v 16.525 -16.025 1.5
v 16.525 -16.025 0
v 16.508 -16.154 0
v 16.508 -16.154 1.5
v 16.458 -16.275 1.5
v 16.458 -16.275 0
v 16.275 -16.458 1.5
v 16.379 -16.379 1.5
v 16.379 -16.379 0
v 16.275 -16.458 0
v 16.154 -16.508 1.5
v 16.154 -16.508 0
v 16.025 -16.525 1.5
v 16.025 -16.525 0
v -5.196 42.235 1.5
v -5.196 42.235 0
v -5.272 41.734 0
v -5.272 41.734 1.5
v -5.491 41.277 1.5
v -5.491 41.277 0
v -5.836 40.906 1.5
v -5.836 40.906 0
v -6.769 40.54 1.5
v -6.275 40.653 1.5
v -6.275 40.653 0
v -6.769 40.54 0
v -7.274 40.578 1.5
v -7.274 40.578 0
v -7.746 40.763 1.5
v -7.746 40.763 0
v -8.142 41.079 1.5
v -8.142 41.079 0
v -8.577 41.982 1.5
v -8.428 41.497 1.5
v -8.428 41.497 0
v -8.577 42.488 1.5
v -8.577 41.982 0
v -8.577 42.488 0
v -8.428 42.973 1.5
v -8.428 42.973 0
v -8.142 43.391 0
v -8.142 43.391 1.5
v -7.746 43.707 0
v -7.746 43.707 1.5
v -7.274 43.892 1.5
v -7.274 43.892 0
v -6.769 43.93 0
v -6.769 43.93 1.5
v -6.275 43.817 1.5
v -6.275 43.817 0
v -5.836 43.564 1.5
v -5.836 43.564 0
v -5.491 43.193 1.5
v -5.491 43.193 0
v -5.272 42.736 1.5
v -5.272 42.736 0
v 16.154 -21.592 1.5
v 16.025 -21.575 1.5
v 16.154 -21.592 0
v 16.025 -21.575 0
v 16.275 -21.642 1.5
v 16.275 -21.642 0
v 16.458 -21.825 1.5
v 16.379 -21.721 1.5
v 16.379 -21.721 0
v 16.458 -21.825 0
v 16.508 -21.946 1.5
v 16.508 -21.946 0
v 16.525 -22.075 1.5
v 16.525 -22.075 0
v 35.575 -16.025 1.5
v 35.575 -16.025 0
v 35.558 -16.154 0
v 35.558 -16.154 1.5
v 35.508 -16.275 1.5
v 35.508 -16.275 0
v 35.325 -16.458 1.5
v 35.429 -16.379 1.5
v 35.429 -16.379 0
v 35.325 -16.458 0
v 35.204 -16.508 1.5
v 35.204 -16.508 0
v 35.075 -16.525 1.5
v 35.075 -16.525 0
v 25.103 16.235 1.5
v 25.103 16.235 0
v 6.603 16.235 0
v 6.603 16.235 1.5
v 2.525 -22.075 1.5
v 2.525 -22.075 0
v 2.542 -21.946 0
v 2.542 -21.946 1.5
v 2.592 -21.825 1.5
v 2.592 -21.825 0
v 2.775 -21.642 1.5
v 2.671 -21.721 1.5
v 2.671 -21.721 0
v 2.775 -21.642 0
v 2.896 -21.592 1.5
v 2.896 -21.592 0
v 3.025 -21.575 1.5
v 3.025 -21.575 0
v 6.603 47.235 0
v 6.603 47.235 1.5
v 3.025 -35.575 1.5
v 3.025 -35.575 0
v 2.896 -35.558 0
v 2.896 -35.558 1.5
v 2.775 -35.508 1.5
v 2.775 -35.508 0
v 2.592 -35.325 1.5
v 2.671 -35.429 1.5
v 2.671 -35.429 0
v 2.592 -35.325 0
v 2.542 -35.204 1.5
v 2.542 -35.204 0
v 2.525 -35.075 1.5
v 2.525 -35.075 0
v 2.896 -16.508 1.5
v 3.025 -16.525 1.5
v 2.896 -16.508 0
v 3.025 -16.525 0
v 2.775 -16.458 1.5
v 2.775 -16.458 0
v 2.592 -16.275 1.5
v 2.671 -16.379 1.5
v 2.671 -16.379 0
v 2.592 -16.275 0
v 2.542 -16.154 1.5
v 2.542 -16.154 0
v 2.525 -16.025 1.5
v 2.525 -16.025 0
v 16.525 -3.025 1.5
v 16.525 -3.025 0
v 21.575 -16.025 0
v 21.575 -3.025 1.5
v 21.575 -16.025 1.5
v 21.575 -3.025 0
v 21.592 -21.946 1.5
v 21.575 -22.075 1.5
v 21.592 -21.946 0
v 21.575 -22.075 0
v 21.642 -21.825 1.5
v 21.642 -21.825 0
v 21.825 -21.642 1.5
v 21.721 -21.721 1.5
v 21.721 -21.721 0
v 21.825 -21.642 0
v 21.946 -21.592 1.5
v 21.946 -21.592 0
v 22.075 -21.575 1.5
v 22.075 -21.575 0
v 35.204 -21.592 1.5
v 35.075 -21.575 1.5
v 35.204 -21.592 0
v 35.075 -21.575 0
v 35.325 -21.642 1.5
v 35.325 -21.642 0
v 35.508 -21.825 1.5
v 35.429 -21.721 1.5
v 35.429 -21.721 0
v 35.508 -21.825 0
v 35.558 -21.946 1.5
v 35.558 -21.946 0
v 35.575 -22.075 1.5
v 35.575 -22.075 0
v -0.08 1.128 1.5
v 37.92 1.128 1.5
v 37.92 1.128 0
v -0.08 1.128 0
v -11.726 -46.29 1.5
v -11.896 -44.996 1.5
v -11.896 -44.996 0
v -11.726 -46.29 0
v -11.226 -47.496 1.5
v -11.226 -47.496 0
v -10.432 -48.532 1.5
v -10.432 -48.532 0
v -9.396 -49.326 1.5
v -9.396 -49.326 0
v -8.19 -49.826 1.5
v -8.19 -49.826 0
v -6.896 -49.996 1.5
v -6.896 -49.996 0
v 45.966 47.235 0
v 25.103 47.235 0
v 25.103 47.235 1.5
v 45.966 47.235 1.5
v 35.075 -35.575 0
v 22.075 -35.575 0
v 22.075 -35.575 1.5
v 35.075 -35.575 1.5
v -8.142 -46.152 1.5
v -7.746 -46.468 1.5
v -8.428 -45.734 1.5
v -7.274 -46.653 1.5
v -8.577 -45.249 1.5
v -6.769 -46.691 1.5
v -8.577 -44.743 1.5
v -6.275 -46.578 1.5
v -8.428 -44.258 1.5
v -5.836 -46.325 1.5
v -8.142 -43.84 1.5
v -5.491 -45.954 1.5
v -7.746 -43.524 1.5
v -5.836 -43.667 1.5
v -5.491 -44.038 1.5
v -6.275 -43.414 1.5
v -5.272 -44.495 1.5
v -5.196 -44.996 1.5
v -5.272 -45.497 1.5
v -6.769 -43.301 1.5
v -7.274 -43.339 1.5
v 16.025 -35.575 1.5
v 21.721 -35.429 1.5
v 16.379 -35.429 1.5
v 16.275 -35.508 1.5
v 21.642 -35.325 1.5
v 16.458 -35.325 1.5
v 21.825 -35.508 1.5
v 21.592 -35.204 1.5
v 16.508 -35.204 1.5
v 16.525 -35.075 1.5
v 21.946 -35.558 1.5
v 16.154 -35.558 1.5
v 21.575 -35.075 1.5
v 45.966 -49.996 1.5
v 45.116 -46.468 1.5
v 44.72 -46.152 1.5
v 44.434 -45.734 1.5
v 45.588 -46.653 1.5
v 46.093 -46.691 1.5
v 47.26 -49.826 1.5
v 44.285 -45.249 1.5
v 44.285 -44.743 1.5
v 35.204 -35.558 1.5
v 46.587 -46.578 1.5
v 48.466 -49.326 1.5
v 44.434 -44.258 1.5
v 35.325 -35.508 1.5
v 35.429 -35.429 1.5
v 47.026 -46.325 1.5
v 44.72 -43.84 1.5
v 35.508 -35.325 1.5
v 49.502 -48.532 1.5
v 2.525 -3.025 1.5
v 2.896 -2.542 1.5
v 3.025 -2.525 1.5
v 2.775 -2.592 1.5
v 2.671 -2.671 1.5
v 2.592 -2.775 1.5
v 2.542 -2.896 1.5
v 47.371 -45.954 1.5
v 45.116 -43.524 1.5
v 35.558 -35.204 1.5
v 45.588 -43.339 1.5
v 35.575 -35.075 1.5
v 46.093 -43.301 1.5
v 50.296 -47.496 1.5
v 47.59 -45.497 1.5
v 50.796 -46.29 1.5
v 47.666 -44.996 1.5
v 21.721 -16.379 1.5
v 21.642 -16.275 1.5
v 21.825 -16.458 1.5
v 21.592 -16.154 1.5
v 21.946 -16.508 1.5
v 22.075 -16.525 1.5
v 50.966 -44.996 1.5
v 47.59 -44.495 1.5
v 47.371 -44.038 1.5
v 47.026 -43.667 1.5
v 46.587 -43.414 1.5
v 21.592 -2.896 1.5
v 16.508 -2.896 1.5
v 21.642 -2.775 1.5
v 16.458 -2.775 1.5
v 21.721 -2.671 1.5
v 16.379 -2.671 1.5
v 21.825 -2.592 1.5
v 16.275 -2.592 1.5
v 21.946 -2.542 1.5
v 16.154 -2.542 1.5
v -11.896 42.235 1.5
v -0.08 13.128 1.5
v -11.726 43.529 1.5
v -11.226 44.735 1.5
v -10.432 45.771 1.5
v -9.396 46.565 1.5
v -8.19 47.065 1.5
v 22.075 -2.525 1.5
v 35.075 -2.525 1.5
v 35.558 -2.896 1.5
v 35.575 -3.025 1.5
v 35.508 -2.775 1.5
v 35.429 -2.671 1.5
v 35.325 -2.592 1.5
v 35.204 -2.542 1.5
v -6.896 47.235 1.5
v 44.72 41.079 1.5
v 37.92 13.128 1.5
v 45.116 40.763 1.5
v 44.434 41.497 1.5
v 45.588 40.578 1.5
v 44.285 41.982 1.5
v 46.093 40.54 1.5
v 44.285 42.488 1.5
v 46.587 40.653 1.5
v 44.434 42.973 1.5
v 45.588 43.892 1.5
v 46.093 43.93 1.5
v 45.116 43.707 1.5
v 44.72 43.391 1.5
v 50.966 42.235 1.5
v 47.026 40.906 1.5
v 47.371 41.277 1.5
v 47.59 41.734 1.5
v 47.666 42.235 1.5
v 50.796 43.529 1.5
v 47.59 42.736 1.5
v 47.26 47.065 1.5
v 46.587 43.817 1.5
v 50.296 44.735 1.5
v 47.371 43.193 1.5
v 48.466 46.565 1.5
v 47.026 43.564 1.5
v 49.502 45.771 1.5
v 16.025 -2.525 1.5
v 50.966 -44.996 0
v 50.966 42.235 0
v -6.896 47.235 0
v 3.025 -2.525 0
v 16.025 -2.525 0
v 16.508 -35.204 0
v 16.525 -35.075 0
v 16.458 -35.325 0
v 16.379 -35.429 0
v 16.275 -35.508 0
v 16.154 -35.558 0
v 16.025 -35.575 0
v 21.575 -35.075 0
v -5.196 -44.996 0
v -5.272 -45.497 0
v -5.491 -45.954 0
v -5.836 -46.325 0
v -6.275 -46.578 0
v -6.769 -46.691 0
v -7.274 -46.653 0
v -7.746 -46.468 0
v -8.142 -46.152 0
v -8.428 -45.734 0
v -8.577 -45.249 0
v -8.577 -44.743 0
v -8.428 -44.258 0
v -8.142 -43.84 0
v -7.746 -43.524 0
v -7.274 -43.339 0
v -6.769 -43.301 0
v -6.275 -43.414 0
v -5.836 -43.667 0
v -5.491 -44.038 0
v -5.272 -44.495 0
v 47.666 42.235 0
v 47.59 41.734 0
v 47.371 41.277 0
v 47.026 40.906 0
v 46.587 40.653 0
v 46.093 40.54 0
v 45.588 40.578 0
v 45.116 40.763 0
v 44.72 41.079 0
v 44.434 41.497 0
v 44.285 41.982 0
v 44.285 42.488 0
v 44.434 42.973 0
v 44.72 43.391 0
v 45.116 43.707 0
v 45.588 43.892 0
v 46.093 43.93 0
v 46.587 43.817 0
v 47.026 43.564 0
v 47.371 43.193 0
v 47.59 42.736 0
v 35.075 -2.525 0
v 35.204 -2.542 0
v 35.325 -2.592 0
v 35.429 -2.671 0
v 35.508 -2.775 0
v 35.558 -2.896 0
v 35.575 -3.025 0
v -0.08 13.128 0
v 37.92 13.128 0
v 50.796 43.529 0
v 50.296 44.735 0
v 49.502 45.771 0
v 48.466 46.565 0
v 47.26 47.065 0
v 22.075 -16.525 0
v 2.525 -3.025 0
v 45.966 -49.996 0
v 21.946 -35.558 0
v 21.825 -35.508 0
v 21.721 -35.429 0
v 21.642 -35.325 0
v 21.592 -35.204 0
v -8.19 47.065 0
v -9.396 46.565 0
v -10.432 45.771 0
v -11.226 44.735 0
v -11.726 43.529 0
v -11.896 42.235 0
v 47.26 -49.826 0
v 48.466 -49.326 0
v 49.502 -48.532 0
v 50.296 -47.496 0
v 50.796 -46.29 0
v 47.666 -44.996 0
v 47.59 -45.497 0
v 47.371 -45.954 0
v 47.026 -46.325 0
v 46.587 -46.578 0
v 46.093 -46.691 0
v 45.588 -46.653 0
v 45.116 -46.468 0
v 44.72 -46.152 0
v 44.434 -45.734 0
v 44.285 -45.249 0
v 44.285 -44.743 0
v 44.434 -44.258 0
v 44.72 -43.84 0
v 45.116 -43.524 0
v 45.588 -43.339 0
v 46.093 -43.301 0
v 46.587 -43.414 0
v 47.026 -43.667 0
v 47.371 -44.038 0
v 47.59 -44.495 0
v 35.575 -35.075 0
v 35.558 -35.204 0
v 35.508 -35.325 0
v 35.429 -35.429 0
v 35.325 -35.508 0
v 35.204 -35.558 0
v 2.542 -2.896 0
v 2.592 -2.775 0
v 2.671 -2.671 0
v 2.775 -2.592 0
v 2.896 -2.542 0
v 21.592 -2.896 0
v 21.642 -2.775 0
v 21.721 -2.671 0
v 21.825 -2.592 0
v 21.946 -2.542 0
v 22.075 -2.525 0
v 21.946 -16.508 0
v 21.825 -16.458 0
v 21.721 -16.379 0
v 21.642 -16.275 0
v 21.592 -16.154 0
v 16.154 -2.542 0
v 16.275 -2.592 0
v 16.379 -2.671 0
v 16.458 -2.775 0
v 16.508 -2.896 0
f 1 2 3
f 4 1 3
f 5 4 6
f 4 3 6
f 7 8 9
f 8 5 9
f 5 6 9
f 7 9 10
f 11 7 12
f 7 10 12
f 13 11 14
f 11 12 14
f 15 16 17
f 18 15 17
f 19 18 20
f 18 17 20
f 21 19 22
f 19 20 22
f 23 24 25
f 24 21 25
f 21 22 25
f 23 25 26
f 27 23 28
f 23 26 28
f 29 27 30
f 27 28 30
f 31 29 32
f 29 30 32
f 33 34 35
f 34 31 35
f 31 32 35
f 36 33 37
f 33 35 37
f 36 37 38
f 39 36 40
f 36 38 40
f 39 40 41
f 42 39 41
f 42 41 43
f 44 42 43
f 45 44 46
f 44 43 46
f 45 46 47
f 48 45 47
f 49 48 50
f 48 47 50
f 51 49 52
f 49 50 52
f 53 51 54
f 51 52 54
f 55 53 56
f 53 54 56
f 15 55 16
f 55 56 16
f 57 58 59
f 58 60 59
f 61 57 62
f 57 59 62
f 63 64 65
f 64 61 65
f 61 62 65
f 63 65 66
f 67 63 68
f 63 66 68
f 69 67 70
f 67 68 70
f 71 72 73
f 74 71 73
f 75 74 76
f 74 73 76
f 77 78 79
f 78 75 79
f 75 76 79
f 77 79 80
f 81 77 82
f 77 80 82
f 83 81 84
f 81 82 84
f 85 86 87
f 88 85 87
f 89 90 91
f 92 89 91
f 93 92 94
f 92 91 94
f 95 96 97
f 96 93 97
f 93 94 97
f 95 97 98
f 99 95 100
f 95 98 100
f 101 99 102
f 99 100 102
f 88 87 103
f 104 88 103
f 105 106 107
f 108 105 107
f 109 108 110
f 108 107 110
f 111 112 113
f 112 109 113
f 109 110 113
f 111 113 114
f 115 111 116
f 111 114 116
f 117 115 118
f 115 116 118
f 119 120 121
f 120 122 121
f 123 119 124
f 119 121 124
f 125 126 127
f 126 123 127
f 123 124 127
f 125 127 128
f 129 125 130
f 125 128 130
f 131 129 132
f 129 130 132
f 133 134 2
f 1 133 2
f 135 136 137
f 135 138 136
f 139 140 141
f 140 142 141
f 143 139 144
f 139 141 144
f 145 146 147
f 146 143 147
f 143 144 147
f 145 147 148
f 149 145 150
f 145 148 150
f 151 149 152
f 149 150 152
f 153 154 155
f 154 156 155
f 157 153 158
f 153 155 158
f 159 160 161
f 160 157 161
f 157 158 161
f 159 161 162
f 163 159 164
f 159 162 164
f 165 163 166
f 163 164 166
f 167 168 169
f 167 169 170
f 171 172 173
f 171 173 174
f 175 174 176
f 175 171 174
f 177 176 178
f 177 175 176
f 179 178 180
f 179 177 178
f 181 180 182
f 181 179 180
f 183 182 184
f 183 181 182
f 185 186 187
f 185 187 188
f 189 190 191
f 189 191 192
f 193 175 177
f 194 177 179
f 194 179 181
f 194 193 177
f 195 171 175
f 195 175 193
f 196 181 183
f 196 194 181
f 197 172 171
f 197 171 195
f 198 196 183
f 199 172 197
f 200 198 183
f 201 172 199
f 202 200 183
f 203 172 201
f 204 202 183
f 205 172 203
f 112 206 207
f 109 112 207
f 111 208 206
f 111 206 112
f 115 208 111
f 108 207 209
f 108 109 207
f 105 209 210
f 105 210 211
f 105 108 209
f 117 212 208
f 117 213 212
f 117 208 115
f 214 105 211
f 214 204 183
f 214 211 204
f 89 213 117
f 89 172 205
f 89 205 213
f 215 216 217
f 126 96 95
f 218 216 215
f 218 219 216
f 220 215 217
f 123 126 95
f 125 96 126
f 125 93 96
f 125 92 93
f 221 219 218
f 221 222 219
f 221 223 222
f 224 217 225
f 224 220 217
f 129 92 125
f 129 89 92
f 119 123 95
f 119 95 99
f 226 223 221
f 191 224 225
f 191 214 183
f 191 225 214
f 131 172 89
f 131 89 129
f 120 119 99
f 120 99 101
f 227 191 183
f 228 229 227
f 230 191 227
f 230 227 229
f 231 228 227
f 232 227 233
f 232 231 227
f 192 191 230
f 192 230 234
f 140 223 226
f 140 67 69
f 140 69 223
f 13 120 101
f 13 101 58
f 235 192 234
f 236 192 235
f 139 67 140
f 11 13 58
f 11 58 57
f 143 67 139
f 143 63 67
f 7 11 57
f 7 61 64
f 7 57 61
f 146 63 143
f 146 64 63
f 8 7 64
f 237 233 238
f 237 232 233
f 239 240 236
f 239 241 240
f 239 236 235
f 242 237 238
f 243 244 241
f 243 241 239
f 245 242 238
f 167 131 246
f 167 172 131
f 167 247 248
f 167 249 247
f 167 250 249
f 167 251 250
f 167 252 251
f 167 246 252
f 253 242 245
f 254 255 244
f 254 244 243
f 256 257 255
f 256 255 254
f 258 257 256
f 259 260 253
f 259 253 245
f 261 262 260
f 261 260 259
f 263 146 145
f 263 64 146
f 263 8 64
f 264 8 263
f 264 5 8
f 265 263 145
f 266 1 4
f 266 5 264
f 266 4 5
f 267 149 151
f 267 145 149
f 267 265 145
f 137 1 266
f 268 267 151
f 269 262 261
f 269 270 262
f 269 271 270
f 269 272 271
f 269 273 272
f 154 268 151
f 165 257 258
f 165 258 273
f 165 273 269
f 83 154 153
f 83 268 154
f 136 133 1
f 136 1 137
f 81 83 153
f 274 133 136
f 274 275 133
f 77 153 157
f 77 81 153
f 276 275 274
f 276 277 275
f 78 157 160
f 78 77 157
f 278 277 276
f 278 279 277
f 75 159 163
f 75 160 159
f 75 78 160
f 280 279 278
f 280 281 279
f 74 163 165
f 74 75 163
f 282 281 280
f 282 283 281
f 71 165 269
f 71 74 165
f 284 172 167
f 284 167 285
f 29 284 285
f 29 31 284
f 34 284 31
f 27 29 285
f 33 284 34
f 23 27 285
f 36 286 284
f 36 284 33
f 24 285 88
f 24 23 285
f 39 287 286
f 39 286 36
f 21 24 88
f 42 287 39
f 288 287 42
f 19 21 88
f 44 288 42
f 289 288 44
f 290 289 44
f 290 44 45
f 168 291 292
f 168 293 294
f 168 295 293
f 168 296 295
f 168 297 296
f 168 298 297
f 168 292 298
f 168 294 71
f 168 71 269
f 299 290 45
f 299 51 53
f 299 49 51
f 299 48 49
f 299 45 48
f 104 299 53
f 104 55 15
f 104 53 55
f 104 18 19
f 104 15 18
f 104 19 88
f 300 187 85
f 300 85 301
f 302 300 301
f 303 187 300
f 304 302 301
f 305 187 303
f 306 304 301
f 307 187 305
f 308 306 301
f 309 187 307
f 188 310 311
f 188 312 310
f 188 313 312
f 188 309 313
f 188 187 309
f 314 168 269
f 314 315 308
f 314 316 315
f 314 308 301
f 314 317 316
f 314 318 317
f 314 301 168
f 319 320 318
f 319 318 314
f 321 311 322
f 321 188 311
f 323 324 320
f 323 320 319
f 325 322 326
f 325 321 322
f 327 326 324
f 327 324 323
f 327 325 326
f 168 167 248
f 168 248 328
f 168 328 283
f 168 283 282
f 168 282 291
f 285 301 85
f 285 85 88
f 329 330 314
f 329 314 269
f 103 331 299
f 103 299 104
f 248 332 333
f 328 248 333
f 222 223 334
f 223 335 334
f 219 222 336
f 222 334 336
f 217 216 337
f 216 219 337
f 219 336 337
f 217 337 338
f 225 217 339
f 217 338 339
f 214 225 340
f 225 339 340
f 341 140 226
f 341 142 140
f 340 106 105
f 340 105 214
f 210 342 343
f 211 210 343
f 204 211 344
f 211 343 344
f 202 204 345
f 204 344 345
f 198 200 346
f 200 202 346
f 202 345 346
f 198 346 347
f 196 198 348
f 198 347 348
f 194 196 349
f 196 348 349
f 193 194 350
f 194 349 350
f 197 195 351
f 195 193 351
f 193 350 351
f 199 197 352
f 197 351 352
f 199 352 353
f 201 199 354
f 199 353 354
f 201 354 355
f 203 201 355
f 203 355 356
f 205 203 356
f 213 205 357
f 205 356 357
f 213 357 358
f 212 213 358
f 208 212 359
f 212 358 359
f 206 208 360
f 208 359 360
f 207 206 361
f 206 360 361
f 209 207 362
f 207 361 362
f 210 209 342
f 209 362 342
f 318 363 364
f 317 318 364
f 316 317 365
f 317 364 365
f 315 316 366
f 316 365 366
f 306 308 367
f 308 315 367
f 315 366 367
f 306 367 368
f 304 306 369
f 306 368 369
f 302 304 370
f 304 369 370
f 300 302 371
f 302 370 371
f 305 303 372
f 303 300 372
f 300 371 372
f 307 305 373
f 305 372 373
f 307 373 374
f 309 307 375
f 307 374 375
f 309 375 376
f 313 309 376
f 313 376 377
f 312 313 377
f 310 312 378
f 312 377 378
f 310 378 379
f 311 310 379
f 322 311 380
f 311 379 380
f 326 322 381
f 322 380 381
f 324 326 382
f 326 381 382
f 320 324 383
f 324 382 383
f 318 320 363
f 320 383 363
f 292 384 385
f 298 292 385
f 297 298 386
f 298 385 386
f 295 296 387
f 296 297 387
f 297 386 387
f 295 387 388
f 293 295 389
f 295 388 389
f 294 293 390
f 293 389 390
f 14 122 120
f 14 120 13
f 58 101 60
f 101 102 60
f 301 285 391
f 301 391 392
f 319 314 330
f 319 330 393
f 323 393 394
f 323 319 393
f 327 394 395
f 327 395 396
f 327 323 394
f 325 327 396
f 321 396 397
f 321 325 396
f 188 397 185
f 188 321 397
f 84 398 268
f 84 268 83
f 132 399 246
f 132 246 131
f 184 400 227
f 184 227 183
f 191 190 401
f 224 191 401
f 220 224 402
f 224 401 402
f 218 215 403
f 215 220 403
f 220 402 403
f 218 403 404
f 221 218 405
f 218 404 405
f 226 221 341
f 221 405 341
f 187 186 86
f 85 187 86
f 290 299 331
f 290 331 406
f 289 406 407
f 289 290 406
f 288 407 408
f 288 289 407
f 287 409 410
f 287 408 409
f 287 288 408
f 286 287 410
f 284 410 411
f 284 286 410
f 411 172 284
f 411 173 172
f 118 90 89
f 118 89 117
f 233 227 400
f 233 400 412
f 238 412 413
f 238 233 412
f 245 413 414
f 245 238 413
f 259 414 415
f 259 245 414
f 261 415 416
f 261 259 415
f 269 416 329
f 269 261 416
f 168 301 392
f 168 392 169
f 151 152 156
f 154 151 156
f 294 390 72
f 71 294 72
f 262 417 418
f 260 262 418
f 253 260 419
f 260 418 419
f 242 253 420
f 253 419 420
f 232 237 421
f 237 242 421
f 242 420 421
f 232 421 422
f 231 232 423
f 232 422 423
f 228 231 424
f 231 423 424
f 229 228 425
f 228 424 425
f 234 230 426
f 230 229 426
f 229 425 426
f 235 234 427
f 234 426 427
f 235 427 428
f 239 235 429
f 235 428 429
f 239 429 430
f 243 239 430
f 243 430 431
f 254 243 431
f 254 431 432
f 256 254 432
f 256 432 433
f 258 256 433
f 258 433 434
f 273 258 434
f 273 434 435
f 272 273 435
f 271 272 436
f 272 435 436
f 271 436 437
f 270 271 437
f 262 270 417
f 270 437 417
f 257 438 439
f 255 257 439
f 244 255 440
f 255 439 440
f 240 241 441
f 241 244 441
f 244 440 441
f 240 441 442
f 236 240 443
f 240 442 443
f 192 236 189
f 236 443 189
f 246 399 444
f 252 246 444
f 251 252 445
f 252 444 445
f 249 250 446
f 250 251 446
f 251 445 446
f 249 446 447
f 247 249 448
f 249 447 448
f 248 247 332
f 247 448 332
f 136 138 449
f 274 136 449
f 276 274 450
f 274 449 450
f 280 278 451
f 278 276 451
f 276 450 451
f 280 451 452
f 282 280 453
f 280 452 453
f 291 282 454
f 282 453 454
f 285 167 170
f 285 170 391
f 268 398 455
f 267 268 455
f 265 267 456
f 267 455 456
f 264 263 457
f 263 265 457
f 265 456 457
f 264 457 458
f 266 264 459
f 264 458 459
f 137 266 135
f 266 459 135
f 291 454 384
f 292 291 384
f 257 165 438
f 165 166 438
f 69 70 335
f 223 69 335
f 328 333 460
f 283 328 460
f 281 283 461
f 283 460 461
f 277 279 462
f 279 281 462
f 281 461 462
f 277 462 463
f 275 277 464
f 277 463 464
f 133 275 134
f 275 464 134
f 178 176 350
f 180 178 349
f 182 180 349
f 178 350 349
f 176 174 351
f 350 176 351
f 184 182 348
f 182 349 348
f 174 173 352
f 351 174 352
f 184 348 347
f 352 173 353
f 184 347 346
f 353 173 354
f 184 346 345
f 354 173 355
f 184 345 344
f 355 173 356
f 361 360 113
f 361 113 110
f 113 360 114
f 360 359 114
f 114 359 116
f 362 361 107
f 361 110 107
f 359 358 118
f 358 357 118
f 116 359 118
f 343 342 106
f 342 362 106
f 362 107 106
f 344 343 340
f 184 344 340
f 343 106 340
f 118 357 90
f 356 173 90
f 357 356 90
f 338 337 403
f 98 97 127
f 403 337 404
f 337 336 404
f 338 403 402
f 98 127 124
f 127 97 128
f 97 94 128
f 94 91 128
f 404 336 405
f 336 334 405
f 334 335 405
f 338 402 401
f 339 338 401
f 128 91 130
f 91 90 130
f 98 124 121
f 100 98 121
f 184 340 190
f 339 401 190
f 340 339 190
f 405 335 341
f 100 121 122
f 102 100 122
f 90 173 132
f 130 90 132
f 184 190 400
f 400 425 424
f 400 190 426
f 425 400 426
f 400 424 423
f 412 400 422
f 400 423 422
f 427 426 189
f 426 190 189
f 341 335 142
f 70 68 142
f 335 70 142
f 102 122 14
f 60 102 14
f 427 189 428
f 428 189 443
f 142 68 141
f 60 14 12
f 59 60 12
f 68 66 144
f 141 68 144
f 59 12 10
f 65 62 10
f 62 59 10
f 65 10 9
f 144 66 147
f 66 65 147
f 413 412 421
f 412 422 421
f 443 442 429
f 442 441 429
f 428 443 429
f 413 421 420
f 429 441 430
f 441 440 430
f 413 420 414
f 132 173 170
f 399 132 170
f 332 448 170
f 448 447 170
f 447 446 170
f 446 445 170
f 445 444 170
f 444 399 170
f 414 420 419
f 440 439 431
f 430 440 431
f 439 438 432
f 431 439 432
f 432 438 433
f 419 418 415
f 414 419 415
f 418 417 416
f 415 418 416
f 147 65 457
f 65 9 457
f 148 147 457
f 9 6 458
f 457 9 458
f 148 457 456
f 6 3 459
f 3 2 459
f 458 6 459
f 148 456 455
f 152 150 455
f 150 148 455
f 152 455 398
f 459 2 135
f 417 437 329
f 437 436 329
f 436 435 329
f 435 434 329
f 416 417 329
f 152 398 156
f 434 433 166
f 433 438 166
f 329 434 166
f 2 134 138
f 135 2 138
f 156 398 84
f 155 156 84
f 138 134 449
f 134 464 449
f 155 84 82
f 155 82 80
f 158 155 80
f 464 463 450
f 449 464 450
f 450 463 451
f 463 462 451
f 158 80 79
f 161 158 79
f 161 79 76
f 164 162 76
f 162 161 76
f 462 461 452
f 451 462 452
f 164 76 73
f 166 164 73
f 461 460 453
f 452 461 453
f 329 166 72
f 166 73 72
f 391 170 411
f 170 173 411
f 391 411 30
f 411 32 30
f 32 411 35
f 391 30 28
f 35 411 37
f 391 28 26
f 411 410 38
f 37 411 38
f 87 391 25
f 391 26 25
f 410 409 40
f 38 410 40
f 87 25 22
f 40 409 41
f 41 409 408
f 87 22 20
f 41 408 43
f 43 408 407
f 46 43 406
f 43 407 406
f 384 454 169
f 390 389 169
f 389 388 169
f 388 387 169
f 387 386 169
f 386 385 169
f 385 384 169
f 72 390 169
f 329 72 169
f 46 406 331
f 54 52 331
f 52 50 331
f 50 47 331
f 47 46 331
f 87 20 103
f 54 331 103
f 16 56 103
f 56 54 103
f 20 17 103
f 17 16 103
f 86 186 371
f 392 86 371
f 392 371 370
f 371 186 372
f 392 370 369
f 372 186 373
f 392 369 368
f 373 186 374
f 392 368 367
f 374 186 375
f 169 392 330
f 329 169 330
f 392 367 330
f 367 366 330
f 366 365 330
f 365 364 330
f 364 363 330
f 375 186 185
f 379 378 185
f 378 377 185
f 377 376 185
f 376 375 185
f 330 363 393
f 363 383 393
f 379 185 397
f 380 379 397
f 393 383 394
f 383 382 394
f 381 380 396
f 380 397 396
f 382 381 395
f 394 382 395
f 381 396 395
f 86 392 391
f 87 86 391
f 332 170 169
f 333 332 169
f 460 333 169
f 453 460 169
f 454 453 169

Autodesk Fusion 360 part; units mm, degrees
sketch "plate-2025-11-24T01_24_03.301Z" plane through (0, 0, 0) normal (0, 0, 1) x (1, 0, 0)
  line L0 (3.025, -2.525) -> (16.025, -2.525)
  line L1 (3.025, -16.525) -> (16.025, -16.525)
  line L2 (2.525, -3.025) -> (2.525, -16.025)
  line L3 (16.525, -3.025) -> (16.525, -16.025)
  arc A0 (3.025, -2.525) -> (2.525, -3.025) centre (3.025, -3.025) ccw
  arc A1 (16.525, -3.025) -> (16.025, -2.525) centre (16.025, -3.025) ccw
  arc A2 (2.525, -16.025) -> (3.025, -16.525) centre (3.025, -16.025) ccw
  arc A3 (16.025, -16.525) -> (16.525, -16.025) centre (16.025, -16.025) ccw
  line L4 (22.075, -2.525) -> (35.075, -2.525)
  line L5 (22.075, -16.525) -> (35.075, -16.525)
  line L6 (21.575, -3.025) -> (21.575, -16.025)
  line L7 (35.575, -3.025) -> (35.575, -16.025)
  arc A4 (22.075, -2.525) -> (21.575, -3.025) centre (22.075, -3.025) ccw
  arc A5 (35.575, -3.025) -> (35.075, -2.525) centre (35.075, -3.025) ccw
  arc A6 (21.575, -16.025) -> (22.075, -16.525) centre (22.075, -16.025) ccw
  arc A7 (35.075, -16.525) -> (35.575, -16.025) centre (35.075, -16.025) ccw
  line L8 (3.025, -21.575) -> (16.025, -21.575)
  line L9 (3.025, -35.575) -> (16.025, -35.575)
  line L10 (2.525, -22.075) -> (2.525, -35.075)
  line L11 (16.525, -22.075) -> (16.525, -35.075)
  arc A8 (3.025, -21.575) -> (2.525, -22.075) centre (3.025, -22.075) ccw
  arc A9 (16.525, -22.075) -> (16.025, -21.575) centre (16.025, -22.075) ccw
  arc A10 (2.525, -35.075) -> (3.025, -35.575) centre (3.025, -35.075) ccw
  arc A11 (16.025, -35.575) -> (16.525, -35.075) centre (16.025, -35.075) ccw
  line L12 (22.075, -21.575) -> (35.075, -21.575)
  line L13 (22.075, -35.575) -> (35.075, -35.575)
  line L14 (21.575, -22.075) -> (21.575, -35.075)
  line L15 (35.575, -22.075) -> (35.575, -35.075)
  arc A12 (22.075, -21.575) -> (21.575, -22.075) centre (22.075, -22.075) ccw
  arc A13 (35.575, -22.075) -> (35.075, -21.575) centre (35.075, -22.075) ccw
  arc A14 (21.575, -35.075) -> (22.075, -35.575) centre (22.075, -35.075) ccw
  arc A15 (35.075, -35.575) -> (35.575, -35.075) centre (35.075, -35.075) ccw
sketch "Sketch2" plane through (0, 0, 0) normal (0, 0, 1) x (1, 0, 0)
  line L0 (-11.896, 47.235) -> (50.966, 47.235)
  line L1 (50.966, 47.235) -> (50.966, -49.996)
  line L2 (50.966, -49.996) -> (-11.896, -49.996)
  line L3 (-11.896, -49.996) -> (-11.896, 47.235)
  line L4 (2.525, -22.075) -> (2.525, -35.075)
  line L5 (3.025, -35.575) -> (16.025, -35.575)
  circle A0 centre (-6.896, 42.235) radius 1.7
  circle A1 centre (45.966, 42.235) radius 1.7
  circle A2 centre (45.966, -44.996) radius 1.7
  circle A3 centre (-6.896, -44.996) radius 1.7
  line L6 (6.603, 47.235) -> (25.103, 47.235)
  line L7 (25.103, 47.235) -> (25.103, 16.235)
  line L8 (25.103, 16.235) -> (6.603, 16.235)
  line L9 (6.603, 16.235) -> (6.603, 47.235)
  dimension "d1" = 62.862
  dimension "d2" = 97.231
  dimension "d3" = 14.421
  dimension "d4" = 14.421
  dimension "d8" = 3.4
  dimension "d9" = 5
  dimension "d10" = 5
  dimension "d11" = 3.4
  dimension "d12" = 5
  dimension "d13" = 5
  dimension "d14" = 3.4
  dimension "d15" = 5
  dimension "d16" = 5
  dimension "d17" = 3.4
  dimension "d18" = 5
  dimension "d19" = 5
  dimension "d20" = 18.5
  dimension "d21" = 31
  dimension "d22" = 18.499
extrude "Extrude1" add sketch "Sketch2" along normal blind 1.5 contours L0 L1 L2 L3 L7 L8 L9
extrude "Extrude2" cut sketch "plate-2025-11-24T01_24_03.301Z" along normal blind 1.5
fillet "Fillet1" radius 5 1 edges at (50.966, -49.996, 0.75)
fillet "Fillet2" radius 5 1 edges at (50.966, 47.235, 0.75)
fillet "Fillet3" radius 5 1 edges at (-11.896, 47.235, 0.75)
fillet "Fillet4" radius 5 1 edges at (-11.896, -49.996, 0.75)
sketch "Sketch3" plane through (0, 0, 1.5) normal (0, 0, 1) x (-1, 0, 0)
  arc A0 (11.896, 44.996) -> (6.896, 49.996) centre (6.896, 44.996) ccw
  line L0 (6.896, 49.996) -> (-45.966, 49.996)
  arc A1 (-45.966, 49.996) -> (-50.966, 44.996) centre (-45.966, 44.996) ccw
  line L1 (-50.966, 44.996) -> (-50.966, -42.235)
  arc A2 (-50.966, -42.235) -> (-45.966, -47.235) centre (-45.966, -42.235) ccw
  line L2 (-45.966, -47.235) -> (-25.103, -47.235)
  line L3 (-25.103, -47.235) -> (-25.103, -16.235)
  line L4 (-25.103, -16.235) -> (-6.603, -16.235)
  line L5 (-6.603, -16.235) -> (-6.603, -47.235)
  line L6 (-6.603, -47.235) -> (6.896, -47.235)
  arc A3 (6.896, -47.235) -> (11.896, -42.235) centre (6.896, -42.235) ccw
  line L7 (11.896, -42.235) -> (11.896, 44.996)
  line L8 (-22.075, 21.575) -> (-35.075, 21.575)
  arc A4 (-35.575, 22.075) -> (-35.075, 21.575) centre (-35.075, 22.075) ccw
  line L9 (-35.575, 22.075) -> (-35.575, 35.075)
  arc A5 (-35.075, 35.575) -> (-35.575, 35.075) centre (-35.075, 35.075) ccw
  line L10 (-35.075, 35.575) -> (-22.075, 35.575)
  arc A6 (-21.575, 35.075) -> (-22.075, 35.575) centre (-22.075, 35.075) ccw
  line L11 (-21.575, 35.075) -> (-21.575, 22.075)
  arc A7 (-22.075, 21.575) -> (-21.575, 22.075) centre (-22.075, 22.075) ccw
  line L12 (-3.025, 2.525) -> (-16.025, 2.525)
  arc A8 (-16.525, 3.025) -> (-16.025, 2.525) centre (-16.025, 3.025) ccw
  line L13 (-16.525, 3.025) -> (-16.525, 16.025)
  arc A9 (-16.025, 16.525) -> (-16.525, 16.025) centre (-16.025, 16.025) ccw
  line L14 (-16.025, 16.525) -> (-3.025, 16.525)
  arc A10 (-2.525, 16.025) -> (-3.025, 16.525) centre (-3.025, 16.025) ccw
  line L15 (-2.525, 16.025) -> (-2.525, 3.025)
  arc A11 (-3.025, 2.525) -> (-2.525, 3.025) centre (-3.025, 3.025) ccw
  line L16 (-3.025, 21.575) -> (-16.025, 21.575)
  arc A12 (-16.525, 22.075) -> (-16.025, 21.575) centre (-16.025, 22.075) ccw
  line L17 (-16.525, 22.075) -> (-16.525, 35.075)
  arc A13 (-16.025, 35.575) -> (-16.525, 35.075) centre (-16.025, 35.075) ccw
  line L18 (-16.025, 35.575) -> (-3.025, 35.575)
  arc A14 (-2.525, 35.075) -> (-3.025, 35.575) centre (-3.025, 35.075) ccw
  line L19 (-2.525, 35.075) -> (-2.525, 22.075)
  arc A15 (-3.025, 21.575) -> (-2.525, 22.075) centre (-3.025, 22.075) ccw
  line L20 (-22.075, 2.525) -> (-35.075, 2.525)
  arc A16 (-35.575, 3.025) -> (-35.075, 2.525) centre (-35.075, 3.025) ccw
  line L21 (-35.575, 3.025) -> (-35.575, 16.025)
  arc A17 (-35.075, 16.525) -> (-35.575, 16.025) centre (-35.075, 16.025) ccw
  line L22 (-35.075, 16.525) -> (-22.075, 16.525)
  arc A18 (-21.575, 16.025) -> (-22.075, 16.525) centre (-22.075, 16.025) ccw
  line L23 (-21.575, 16.025) -> (-21.575, 3.025)
  arc A19 (-22.075, 2.525) -> (-21.575, 3.025) centre (-22.075, 3.025) ccw
  circle A20 centre (6.896, -42.235) radius 1.7
  circle A21 centre (-45.966, 44.996) radius 1.7
  circle A22 centre (-45.966, -42.235) radius 1.7
  circle A23 centre (6.896, 44.996) radius 1.7
  line L24 (0.08, -13.128) -> (-37.92, -13.128)
  line L25 (-37.92, -13.128) -> (-37.92, -1.128)
  line L26 (-37.92, -1.128) -> (0.08, -1.128)
  line L27 (0.08, -1.128) -> (0.08, -13.128)
  line L28 (11.896, 49.996) -> (11.896, -47.235)
  dimension "d35" = 38
  dimension "d36" = 12
  dimension "d37" = 11.816
extrude "Extrude3" cut sketch "Sketch3" against normal blind 1.5 contours L24 L25 L26 L27
